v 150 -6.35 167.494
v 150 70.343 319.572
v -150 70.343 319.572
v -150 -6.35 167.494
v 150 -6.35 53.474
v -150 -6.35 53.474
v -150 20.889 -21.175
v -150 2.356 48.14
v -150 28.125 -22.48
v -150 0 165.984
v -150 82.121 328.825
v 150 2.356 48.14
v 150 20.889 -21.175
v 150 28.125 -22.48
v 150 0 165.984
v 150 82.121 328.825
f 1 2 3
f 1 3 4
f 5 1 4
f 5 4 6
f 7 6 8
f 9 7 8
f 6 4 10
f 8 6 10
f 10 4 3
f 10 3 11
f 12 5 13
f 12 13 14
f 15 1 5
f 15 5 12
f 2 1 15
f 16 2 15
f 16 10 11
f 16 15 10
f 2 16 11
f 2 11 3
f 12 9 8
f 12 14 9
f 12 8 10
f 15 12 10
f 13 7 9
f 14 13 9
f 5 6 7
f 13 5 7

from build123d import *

# Parameters (mm, degrees)
F1_DEPTH      = 150
F1_DEPTH_BACK = 150


with BuildPart() as f1:
    # F0 (on Right) → F1 (new body, two sides)
    with BuildSketch(Plane.YZ) as f1_sk:
        Polygon((0, 165.983751), (82.12112, 328.824738), (70.343, 319.571674), (-6.35, 167.494305), (-6.35, 53.473559), (20.889167, -21.175262), (28.124628, -22.479507), (2.355591, 48.140429), align=None)
    extrude(amount=F1_DEPTH)
    extrude(f1_sk.sketch, amount=-F1_DEPTH_BACK)


solid = f1.part
